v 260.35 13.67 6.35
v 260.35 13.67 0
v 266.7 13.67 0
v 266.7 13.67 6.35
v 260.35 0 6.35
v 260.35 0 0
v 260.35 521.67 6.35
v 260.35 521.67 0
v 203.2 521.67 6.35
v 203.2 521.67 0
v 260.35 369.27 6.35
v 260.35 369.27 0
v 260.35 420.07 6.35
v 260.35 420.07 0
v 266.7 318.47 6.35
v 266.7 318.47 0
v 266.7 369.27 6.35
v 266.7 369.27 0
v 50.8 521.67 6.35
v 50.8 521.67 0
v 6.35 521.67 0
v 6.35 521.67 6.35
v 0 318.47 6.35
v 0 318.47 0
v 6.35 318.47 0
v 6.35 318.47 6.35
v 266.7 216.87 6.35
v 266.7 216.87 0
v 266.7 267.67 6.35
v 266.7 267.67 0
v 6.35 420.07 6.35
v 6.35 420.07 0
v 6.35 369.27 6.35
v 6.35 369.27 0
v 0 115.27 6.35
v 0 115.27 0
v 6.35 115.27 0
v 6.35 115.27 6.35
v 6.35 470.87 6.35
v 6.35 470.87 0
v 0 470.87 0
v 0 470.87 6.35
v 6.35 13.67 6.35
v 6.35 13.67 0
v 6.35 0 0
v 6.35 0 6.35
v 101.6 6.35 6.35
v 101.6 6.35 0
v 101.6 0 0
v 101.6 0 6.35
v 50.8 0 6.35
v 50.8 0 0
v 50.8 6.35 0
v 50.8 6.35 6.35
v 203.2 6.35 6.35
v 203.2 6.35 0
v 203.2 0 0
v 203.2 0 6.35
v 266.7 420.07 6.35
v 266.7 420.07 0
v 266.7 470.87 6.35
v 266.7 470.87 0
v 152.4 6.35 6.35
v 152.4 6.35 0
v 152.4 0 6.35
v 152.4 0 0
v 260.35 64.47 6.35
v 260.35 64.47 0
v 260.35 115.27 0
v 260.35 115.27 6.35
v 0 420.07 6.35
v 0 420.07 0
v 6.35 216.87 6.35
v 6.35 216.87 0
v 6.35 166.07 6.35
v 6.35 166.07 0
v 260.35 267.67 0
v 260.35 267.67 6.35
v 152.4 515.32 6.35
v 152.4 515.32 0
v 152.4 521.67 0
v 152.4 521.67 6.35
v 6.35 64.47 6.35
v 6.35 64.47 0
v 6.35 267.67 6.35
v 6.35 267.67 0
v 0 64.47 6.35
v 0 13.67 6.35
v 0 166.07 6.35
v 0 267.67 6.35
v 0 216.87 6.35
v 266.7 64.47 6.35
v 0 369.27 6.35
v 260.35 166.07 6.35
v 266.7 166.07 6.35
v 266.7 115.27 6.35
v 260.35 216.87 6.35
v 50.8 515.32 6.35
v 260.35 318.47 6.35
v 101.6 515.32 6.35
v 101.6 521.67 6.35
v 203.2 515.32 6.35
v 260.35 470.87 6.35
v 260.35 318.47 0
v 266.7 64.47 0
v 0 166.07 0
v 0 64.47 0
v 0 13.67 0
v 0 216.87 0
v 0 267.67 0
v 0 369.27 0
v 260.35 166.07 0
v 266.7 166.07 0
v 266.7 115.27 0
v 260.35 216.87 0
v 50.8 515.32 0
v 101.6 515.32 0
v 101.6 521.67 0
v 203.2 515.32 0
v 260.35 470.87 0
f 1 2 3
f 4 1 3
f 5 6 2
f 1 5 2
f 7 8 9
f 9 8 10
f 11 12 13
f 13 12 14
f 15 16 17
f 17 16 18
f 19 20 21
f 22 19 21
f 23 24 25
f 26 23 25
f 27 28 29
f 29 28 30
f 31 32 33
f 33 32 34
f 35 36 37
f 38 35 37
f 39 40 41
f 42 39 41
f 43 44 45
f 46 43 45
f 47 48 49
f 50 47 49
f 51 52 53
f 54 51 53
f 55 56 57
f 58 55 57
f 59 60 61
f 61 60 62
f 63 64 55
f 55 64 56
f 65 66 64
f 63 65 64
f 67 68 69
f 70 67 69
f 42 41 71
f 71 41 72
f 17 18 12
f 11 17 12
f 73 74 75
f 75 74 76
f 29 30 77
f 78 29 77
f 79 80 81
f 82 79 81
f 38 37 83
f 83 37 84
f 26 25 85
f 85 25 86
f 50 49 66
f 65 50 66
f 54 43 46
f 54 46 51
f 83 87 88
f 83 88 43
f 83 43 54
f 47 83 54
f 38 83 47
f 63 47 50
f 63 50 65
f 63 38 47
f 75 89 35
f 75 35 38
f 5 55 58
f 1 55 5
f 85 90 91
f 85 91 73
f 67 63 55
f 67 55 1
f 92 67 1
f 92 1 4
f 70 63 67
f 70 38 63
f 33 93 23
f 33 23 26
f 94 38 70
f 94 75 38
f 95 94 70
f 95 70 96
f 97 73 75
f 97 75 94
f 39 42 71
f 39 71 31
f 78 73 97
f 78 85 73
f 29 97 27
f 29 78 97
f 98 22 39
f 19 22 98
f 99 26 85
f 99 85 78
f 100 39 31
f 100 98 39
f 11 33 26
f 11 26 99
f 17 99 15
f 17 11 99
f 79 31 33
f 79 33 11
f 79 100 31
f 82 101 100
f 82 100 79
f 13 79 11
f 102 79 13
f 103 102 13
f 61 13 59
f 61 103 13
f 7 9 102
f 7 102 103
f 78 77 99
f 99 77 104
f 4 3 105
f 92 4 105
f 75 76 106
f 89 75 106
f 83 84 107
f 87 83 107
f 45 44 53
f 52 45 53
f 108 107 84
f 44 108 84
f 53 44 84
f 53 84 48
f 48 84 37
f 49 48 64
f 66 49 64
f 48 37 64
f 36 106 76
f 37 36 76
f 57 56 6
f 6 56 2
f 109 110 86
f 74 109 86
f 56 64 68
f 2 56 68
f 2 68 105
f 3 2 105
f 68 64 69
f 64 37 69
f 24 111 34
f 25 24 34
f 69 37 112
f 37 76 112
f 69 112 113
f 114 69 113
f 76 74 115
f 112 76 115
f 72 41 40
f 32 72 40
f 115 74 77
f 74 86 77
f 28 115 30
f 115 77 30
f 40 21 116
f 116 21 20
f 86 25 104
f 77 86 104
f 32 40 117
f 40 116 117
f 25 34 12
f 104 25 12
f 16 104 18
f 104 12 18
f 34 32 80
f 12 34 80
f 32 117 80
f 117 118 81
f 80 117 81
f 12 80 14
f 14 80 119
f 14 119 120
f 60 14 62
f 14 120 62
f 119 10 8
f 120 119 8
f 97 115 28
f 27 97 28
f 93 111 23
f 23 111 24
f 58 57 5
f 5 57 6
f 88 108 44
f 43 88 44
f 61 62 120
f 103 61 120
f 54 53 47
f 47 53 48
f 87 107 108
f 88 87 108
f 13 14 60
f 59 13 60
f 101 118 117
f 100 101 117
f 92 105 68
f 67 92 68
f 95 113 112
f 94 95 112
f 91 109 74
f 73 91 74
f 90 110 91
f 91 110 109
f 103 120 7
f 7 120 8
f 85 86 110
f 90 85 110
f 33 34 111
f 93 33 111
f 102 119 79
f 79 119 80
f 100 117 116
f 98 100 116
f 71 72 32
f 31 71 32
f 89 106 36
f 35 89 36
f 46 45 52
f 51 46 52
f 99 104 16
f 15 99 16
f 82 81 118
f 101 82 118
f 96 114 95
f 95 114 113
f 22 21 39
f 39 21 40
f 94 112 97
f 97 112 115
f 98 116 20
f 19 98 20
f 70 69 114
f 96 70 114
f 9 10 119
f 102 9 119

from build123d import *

# Parameters (mm, degrees)
BOSS_EXTRUDE1_DEPTH = 6.35


with BuildPart() as part:
    # Sketch1 → Boss-Extrude1 (new body)
    with BuildSketch(Plane.XY):
        Polygon((6.35, 521.67), (6.35, 470.87), (0, 470.87), (0, 420.07), (6.35, 420.07), (6.35, 369.27), (0, 369.27), (0, 318.47), (6.35, 318.47), (6.35, 267.67), (0, 267.67), (0, 216.87), (6.35, 216.87), (6.35, 166.07), (0, 166.07), (0, 115.27), (6.35, 115.27), (6.35, 64.47), (0, 64.47), (0, 13.67), (6.35, 13.67), (6.35, 0), (50.8, 0), (50.8, 6.35), (101.6, 6.35), (101.6, 0), (152.4, 0), (152.4, 6.35), (203.2, 6.35), (203.2, 0), (254, 0), (260.35, 0), (260.35, 6.35), (260.35, 13.67), (266.7, 13.67), (266.7, 64.47), (260.35, 64.47), (260.35, 115.27), (266.7, 115.27), (266.7, 166.07), (260.35, 166.07), (260.35, 216.87), (266.7, 216.87), (266.7, 267.67), (260.35, 267.67), (260.35, 318.47), (266.7, 318.47), (266.7, 369.27), (260.35, 369.27), (260.35, 420.07), (266.7, 420.07), (266.7, 470.87), (260.35, 470.87), (260.35, 521.67), (254, 521.67), (203.2, 521.67), (203.2, 515.32), (152.4, 515.32), (152.4, 521.67), (101.6, 521.67), (101.6, 515.32), (50.8, 515.32), (50.8, 521.67), align=None)
    extrude(amount=BOSS_EXTRUDE1_DEPTH)


solid = part.part
